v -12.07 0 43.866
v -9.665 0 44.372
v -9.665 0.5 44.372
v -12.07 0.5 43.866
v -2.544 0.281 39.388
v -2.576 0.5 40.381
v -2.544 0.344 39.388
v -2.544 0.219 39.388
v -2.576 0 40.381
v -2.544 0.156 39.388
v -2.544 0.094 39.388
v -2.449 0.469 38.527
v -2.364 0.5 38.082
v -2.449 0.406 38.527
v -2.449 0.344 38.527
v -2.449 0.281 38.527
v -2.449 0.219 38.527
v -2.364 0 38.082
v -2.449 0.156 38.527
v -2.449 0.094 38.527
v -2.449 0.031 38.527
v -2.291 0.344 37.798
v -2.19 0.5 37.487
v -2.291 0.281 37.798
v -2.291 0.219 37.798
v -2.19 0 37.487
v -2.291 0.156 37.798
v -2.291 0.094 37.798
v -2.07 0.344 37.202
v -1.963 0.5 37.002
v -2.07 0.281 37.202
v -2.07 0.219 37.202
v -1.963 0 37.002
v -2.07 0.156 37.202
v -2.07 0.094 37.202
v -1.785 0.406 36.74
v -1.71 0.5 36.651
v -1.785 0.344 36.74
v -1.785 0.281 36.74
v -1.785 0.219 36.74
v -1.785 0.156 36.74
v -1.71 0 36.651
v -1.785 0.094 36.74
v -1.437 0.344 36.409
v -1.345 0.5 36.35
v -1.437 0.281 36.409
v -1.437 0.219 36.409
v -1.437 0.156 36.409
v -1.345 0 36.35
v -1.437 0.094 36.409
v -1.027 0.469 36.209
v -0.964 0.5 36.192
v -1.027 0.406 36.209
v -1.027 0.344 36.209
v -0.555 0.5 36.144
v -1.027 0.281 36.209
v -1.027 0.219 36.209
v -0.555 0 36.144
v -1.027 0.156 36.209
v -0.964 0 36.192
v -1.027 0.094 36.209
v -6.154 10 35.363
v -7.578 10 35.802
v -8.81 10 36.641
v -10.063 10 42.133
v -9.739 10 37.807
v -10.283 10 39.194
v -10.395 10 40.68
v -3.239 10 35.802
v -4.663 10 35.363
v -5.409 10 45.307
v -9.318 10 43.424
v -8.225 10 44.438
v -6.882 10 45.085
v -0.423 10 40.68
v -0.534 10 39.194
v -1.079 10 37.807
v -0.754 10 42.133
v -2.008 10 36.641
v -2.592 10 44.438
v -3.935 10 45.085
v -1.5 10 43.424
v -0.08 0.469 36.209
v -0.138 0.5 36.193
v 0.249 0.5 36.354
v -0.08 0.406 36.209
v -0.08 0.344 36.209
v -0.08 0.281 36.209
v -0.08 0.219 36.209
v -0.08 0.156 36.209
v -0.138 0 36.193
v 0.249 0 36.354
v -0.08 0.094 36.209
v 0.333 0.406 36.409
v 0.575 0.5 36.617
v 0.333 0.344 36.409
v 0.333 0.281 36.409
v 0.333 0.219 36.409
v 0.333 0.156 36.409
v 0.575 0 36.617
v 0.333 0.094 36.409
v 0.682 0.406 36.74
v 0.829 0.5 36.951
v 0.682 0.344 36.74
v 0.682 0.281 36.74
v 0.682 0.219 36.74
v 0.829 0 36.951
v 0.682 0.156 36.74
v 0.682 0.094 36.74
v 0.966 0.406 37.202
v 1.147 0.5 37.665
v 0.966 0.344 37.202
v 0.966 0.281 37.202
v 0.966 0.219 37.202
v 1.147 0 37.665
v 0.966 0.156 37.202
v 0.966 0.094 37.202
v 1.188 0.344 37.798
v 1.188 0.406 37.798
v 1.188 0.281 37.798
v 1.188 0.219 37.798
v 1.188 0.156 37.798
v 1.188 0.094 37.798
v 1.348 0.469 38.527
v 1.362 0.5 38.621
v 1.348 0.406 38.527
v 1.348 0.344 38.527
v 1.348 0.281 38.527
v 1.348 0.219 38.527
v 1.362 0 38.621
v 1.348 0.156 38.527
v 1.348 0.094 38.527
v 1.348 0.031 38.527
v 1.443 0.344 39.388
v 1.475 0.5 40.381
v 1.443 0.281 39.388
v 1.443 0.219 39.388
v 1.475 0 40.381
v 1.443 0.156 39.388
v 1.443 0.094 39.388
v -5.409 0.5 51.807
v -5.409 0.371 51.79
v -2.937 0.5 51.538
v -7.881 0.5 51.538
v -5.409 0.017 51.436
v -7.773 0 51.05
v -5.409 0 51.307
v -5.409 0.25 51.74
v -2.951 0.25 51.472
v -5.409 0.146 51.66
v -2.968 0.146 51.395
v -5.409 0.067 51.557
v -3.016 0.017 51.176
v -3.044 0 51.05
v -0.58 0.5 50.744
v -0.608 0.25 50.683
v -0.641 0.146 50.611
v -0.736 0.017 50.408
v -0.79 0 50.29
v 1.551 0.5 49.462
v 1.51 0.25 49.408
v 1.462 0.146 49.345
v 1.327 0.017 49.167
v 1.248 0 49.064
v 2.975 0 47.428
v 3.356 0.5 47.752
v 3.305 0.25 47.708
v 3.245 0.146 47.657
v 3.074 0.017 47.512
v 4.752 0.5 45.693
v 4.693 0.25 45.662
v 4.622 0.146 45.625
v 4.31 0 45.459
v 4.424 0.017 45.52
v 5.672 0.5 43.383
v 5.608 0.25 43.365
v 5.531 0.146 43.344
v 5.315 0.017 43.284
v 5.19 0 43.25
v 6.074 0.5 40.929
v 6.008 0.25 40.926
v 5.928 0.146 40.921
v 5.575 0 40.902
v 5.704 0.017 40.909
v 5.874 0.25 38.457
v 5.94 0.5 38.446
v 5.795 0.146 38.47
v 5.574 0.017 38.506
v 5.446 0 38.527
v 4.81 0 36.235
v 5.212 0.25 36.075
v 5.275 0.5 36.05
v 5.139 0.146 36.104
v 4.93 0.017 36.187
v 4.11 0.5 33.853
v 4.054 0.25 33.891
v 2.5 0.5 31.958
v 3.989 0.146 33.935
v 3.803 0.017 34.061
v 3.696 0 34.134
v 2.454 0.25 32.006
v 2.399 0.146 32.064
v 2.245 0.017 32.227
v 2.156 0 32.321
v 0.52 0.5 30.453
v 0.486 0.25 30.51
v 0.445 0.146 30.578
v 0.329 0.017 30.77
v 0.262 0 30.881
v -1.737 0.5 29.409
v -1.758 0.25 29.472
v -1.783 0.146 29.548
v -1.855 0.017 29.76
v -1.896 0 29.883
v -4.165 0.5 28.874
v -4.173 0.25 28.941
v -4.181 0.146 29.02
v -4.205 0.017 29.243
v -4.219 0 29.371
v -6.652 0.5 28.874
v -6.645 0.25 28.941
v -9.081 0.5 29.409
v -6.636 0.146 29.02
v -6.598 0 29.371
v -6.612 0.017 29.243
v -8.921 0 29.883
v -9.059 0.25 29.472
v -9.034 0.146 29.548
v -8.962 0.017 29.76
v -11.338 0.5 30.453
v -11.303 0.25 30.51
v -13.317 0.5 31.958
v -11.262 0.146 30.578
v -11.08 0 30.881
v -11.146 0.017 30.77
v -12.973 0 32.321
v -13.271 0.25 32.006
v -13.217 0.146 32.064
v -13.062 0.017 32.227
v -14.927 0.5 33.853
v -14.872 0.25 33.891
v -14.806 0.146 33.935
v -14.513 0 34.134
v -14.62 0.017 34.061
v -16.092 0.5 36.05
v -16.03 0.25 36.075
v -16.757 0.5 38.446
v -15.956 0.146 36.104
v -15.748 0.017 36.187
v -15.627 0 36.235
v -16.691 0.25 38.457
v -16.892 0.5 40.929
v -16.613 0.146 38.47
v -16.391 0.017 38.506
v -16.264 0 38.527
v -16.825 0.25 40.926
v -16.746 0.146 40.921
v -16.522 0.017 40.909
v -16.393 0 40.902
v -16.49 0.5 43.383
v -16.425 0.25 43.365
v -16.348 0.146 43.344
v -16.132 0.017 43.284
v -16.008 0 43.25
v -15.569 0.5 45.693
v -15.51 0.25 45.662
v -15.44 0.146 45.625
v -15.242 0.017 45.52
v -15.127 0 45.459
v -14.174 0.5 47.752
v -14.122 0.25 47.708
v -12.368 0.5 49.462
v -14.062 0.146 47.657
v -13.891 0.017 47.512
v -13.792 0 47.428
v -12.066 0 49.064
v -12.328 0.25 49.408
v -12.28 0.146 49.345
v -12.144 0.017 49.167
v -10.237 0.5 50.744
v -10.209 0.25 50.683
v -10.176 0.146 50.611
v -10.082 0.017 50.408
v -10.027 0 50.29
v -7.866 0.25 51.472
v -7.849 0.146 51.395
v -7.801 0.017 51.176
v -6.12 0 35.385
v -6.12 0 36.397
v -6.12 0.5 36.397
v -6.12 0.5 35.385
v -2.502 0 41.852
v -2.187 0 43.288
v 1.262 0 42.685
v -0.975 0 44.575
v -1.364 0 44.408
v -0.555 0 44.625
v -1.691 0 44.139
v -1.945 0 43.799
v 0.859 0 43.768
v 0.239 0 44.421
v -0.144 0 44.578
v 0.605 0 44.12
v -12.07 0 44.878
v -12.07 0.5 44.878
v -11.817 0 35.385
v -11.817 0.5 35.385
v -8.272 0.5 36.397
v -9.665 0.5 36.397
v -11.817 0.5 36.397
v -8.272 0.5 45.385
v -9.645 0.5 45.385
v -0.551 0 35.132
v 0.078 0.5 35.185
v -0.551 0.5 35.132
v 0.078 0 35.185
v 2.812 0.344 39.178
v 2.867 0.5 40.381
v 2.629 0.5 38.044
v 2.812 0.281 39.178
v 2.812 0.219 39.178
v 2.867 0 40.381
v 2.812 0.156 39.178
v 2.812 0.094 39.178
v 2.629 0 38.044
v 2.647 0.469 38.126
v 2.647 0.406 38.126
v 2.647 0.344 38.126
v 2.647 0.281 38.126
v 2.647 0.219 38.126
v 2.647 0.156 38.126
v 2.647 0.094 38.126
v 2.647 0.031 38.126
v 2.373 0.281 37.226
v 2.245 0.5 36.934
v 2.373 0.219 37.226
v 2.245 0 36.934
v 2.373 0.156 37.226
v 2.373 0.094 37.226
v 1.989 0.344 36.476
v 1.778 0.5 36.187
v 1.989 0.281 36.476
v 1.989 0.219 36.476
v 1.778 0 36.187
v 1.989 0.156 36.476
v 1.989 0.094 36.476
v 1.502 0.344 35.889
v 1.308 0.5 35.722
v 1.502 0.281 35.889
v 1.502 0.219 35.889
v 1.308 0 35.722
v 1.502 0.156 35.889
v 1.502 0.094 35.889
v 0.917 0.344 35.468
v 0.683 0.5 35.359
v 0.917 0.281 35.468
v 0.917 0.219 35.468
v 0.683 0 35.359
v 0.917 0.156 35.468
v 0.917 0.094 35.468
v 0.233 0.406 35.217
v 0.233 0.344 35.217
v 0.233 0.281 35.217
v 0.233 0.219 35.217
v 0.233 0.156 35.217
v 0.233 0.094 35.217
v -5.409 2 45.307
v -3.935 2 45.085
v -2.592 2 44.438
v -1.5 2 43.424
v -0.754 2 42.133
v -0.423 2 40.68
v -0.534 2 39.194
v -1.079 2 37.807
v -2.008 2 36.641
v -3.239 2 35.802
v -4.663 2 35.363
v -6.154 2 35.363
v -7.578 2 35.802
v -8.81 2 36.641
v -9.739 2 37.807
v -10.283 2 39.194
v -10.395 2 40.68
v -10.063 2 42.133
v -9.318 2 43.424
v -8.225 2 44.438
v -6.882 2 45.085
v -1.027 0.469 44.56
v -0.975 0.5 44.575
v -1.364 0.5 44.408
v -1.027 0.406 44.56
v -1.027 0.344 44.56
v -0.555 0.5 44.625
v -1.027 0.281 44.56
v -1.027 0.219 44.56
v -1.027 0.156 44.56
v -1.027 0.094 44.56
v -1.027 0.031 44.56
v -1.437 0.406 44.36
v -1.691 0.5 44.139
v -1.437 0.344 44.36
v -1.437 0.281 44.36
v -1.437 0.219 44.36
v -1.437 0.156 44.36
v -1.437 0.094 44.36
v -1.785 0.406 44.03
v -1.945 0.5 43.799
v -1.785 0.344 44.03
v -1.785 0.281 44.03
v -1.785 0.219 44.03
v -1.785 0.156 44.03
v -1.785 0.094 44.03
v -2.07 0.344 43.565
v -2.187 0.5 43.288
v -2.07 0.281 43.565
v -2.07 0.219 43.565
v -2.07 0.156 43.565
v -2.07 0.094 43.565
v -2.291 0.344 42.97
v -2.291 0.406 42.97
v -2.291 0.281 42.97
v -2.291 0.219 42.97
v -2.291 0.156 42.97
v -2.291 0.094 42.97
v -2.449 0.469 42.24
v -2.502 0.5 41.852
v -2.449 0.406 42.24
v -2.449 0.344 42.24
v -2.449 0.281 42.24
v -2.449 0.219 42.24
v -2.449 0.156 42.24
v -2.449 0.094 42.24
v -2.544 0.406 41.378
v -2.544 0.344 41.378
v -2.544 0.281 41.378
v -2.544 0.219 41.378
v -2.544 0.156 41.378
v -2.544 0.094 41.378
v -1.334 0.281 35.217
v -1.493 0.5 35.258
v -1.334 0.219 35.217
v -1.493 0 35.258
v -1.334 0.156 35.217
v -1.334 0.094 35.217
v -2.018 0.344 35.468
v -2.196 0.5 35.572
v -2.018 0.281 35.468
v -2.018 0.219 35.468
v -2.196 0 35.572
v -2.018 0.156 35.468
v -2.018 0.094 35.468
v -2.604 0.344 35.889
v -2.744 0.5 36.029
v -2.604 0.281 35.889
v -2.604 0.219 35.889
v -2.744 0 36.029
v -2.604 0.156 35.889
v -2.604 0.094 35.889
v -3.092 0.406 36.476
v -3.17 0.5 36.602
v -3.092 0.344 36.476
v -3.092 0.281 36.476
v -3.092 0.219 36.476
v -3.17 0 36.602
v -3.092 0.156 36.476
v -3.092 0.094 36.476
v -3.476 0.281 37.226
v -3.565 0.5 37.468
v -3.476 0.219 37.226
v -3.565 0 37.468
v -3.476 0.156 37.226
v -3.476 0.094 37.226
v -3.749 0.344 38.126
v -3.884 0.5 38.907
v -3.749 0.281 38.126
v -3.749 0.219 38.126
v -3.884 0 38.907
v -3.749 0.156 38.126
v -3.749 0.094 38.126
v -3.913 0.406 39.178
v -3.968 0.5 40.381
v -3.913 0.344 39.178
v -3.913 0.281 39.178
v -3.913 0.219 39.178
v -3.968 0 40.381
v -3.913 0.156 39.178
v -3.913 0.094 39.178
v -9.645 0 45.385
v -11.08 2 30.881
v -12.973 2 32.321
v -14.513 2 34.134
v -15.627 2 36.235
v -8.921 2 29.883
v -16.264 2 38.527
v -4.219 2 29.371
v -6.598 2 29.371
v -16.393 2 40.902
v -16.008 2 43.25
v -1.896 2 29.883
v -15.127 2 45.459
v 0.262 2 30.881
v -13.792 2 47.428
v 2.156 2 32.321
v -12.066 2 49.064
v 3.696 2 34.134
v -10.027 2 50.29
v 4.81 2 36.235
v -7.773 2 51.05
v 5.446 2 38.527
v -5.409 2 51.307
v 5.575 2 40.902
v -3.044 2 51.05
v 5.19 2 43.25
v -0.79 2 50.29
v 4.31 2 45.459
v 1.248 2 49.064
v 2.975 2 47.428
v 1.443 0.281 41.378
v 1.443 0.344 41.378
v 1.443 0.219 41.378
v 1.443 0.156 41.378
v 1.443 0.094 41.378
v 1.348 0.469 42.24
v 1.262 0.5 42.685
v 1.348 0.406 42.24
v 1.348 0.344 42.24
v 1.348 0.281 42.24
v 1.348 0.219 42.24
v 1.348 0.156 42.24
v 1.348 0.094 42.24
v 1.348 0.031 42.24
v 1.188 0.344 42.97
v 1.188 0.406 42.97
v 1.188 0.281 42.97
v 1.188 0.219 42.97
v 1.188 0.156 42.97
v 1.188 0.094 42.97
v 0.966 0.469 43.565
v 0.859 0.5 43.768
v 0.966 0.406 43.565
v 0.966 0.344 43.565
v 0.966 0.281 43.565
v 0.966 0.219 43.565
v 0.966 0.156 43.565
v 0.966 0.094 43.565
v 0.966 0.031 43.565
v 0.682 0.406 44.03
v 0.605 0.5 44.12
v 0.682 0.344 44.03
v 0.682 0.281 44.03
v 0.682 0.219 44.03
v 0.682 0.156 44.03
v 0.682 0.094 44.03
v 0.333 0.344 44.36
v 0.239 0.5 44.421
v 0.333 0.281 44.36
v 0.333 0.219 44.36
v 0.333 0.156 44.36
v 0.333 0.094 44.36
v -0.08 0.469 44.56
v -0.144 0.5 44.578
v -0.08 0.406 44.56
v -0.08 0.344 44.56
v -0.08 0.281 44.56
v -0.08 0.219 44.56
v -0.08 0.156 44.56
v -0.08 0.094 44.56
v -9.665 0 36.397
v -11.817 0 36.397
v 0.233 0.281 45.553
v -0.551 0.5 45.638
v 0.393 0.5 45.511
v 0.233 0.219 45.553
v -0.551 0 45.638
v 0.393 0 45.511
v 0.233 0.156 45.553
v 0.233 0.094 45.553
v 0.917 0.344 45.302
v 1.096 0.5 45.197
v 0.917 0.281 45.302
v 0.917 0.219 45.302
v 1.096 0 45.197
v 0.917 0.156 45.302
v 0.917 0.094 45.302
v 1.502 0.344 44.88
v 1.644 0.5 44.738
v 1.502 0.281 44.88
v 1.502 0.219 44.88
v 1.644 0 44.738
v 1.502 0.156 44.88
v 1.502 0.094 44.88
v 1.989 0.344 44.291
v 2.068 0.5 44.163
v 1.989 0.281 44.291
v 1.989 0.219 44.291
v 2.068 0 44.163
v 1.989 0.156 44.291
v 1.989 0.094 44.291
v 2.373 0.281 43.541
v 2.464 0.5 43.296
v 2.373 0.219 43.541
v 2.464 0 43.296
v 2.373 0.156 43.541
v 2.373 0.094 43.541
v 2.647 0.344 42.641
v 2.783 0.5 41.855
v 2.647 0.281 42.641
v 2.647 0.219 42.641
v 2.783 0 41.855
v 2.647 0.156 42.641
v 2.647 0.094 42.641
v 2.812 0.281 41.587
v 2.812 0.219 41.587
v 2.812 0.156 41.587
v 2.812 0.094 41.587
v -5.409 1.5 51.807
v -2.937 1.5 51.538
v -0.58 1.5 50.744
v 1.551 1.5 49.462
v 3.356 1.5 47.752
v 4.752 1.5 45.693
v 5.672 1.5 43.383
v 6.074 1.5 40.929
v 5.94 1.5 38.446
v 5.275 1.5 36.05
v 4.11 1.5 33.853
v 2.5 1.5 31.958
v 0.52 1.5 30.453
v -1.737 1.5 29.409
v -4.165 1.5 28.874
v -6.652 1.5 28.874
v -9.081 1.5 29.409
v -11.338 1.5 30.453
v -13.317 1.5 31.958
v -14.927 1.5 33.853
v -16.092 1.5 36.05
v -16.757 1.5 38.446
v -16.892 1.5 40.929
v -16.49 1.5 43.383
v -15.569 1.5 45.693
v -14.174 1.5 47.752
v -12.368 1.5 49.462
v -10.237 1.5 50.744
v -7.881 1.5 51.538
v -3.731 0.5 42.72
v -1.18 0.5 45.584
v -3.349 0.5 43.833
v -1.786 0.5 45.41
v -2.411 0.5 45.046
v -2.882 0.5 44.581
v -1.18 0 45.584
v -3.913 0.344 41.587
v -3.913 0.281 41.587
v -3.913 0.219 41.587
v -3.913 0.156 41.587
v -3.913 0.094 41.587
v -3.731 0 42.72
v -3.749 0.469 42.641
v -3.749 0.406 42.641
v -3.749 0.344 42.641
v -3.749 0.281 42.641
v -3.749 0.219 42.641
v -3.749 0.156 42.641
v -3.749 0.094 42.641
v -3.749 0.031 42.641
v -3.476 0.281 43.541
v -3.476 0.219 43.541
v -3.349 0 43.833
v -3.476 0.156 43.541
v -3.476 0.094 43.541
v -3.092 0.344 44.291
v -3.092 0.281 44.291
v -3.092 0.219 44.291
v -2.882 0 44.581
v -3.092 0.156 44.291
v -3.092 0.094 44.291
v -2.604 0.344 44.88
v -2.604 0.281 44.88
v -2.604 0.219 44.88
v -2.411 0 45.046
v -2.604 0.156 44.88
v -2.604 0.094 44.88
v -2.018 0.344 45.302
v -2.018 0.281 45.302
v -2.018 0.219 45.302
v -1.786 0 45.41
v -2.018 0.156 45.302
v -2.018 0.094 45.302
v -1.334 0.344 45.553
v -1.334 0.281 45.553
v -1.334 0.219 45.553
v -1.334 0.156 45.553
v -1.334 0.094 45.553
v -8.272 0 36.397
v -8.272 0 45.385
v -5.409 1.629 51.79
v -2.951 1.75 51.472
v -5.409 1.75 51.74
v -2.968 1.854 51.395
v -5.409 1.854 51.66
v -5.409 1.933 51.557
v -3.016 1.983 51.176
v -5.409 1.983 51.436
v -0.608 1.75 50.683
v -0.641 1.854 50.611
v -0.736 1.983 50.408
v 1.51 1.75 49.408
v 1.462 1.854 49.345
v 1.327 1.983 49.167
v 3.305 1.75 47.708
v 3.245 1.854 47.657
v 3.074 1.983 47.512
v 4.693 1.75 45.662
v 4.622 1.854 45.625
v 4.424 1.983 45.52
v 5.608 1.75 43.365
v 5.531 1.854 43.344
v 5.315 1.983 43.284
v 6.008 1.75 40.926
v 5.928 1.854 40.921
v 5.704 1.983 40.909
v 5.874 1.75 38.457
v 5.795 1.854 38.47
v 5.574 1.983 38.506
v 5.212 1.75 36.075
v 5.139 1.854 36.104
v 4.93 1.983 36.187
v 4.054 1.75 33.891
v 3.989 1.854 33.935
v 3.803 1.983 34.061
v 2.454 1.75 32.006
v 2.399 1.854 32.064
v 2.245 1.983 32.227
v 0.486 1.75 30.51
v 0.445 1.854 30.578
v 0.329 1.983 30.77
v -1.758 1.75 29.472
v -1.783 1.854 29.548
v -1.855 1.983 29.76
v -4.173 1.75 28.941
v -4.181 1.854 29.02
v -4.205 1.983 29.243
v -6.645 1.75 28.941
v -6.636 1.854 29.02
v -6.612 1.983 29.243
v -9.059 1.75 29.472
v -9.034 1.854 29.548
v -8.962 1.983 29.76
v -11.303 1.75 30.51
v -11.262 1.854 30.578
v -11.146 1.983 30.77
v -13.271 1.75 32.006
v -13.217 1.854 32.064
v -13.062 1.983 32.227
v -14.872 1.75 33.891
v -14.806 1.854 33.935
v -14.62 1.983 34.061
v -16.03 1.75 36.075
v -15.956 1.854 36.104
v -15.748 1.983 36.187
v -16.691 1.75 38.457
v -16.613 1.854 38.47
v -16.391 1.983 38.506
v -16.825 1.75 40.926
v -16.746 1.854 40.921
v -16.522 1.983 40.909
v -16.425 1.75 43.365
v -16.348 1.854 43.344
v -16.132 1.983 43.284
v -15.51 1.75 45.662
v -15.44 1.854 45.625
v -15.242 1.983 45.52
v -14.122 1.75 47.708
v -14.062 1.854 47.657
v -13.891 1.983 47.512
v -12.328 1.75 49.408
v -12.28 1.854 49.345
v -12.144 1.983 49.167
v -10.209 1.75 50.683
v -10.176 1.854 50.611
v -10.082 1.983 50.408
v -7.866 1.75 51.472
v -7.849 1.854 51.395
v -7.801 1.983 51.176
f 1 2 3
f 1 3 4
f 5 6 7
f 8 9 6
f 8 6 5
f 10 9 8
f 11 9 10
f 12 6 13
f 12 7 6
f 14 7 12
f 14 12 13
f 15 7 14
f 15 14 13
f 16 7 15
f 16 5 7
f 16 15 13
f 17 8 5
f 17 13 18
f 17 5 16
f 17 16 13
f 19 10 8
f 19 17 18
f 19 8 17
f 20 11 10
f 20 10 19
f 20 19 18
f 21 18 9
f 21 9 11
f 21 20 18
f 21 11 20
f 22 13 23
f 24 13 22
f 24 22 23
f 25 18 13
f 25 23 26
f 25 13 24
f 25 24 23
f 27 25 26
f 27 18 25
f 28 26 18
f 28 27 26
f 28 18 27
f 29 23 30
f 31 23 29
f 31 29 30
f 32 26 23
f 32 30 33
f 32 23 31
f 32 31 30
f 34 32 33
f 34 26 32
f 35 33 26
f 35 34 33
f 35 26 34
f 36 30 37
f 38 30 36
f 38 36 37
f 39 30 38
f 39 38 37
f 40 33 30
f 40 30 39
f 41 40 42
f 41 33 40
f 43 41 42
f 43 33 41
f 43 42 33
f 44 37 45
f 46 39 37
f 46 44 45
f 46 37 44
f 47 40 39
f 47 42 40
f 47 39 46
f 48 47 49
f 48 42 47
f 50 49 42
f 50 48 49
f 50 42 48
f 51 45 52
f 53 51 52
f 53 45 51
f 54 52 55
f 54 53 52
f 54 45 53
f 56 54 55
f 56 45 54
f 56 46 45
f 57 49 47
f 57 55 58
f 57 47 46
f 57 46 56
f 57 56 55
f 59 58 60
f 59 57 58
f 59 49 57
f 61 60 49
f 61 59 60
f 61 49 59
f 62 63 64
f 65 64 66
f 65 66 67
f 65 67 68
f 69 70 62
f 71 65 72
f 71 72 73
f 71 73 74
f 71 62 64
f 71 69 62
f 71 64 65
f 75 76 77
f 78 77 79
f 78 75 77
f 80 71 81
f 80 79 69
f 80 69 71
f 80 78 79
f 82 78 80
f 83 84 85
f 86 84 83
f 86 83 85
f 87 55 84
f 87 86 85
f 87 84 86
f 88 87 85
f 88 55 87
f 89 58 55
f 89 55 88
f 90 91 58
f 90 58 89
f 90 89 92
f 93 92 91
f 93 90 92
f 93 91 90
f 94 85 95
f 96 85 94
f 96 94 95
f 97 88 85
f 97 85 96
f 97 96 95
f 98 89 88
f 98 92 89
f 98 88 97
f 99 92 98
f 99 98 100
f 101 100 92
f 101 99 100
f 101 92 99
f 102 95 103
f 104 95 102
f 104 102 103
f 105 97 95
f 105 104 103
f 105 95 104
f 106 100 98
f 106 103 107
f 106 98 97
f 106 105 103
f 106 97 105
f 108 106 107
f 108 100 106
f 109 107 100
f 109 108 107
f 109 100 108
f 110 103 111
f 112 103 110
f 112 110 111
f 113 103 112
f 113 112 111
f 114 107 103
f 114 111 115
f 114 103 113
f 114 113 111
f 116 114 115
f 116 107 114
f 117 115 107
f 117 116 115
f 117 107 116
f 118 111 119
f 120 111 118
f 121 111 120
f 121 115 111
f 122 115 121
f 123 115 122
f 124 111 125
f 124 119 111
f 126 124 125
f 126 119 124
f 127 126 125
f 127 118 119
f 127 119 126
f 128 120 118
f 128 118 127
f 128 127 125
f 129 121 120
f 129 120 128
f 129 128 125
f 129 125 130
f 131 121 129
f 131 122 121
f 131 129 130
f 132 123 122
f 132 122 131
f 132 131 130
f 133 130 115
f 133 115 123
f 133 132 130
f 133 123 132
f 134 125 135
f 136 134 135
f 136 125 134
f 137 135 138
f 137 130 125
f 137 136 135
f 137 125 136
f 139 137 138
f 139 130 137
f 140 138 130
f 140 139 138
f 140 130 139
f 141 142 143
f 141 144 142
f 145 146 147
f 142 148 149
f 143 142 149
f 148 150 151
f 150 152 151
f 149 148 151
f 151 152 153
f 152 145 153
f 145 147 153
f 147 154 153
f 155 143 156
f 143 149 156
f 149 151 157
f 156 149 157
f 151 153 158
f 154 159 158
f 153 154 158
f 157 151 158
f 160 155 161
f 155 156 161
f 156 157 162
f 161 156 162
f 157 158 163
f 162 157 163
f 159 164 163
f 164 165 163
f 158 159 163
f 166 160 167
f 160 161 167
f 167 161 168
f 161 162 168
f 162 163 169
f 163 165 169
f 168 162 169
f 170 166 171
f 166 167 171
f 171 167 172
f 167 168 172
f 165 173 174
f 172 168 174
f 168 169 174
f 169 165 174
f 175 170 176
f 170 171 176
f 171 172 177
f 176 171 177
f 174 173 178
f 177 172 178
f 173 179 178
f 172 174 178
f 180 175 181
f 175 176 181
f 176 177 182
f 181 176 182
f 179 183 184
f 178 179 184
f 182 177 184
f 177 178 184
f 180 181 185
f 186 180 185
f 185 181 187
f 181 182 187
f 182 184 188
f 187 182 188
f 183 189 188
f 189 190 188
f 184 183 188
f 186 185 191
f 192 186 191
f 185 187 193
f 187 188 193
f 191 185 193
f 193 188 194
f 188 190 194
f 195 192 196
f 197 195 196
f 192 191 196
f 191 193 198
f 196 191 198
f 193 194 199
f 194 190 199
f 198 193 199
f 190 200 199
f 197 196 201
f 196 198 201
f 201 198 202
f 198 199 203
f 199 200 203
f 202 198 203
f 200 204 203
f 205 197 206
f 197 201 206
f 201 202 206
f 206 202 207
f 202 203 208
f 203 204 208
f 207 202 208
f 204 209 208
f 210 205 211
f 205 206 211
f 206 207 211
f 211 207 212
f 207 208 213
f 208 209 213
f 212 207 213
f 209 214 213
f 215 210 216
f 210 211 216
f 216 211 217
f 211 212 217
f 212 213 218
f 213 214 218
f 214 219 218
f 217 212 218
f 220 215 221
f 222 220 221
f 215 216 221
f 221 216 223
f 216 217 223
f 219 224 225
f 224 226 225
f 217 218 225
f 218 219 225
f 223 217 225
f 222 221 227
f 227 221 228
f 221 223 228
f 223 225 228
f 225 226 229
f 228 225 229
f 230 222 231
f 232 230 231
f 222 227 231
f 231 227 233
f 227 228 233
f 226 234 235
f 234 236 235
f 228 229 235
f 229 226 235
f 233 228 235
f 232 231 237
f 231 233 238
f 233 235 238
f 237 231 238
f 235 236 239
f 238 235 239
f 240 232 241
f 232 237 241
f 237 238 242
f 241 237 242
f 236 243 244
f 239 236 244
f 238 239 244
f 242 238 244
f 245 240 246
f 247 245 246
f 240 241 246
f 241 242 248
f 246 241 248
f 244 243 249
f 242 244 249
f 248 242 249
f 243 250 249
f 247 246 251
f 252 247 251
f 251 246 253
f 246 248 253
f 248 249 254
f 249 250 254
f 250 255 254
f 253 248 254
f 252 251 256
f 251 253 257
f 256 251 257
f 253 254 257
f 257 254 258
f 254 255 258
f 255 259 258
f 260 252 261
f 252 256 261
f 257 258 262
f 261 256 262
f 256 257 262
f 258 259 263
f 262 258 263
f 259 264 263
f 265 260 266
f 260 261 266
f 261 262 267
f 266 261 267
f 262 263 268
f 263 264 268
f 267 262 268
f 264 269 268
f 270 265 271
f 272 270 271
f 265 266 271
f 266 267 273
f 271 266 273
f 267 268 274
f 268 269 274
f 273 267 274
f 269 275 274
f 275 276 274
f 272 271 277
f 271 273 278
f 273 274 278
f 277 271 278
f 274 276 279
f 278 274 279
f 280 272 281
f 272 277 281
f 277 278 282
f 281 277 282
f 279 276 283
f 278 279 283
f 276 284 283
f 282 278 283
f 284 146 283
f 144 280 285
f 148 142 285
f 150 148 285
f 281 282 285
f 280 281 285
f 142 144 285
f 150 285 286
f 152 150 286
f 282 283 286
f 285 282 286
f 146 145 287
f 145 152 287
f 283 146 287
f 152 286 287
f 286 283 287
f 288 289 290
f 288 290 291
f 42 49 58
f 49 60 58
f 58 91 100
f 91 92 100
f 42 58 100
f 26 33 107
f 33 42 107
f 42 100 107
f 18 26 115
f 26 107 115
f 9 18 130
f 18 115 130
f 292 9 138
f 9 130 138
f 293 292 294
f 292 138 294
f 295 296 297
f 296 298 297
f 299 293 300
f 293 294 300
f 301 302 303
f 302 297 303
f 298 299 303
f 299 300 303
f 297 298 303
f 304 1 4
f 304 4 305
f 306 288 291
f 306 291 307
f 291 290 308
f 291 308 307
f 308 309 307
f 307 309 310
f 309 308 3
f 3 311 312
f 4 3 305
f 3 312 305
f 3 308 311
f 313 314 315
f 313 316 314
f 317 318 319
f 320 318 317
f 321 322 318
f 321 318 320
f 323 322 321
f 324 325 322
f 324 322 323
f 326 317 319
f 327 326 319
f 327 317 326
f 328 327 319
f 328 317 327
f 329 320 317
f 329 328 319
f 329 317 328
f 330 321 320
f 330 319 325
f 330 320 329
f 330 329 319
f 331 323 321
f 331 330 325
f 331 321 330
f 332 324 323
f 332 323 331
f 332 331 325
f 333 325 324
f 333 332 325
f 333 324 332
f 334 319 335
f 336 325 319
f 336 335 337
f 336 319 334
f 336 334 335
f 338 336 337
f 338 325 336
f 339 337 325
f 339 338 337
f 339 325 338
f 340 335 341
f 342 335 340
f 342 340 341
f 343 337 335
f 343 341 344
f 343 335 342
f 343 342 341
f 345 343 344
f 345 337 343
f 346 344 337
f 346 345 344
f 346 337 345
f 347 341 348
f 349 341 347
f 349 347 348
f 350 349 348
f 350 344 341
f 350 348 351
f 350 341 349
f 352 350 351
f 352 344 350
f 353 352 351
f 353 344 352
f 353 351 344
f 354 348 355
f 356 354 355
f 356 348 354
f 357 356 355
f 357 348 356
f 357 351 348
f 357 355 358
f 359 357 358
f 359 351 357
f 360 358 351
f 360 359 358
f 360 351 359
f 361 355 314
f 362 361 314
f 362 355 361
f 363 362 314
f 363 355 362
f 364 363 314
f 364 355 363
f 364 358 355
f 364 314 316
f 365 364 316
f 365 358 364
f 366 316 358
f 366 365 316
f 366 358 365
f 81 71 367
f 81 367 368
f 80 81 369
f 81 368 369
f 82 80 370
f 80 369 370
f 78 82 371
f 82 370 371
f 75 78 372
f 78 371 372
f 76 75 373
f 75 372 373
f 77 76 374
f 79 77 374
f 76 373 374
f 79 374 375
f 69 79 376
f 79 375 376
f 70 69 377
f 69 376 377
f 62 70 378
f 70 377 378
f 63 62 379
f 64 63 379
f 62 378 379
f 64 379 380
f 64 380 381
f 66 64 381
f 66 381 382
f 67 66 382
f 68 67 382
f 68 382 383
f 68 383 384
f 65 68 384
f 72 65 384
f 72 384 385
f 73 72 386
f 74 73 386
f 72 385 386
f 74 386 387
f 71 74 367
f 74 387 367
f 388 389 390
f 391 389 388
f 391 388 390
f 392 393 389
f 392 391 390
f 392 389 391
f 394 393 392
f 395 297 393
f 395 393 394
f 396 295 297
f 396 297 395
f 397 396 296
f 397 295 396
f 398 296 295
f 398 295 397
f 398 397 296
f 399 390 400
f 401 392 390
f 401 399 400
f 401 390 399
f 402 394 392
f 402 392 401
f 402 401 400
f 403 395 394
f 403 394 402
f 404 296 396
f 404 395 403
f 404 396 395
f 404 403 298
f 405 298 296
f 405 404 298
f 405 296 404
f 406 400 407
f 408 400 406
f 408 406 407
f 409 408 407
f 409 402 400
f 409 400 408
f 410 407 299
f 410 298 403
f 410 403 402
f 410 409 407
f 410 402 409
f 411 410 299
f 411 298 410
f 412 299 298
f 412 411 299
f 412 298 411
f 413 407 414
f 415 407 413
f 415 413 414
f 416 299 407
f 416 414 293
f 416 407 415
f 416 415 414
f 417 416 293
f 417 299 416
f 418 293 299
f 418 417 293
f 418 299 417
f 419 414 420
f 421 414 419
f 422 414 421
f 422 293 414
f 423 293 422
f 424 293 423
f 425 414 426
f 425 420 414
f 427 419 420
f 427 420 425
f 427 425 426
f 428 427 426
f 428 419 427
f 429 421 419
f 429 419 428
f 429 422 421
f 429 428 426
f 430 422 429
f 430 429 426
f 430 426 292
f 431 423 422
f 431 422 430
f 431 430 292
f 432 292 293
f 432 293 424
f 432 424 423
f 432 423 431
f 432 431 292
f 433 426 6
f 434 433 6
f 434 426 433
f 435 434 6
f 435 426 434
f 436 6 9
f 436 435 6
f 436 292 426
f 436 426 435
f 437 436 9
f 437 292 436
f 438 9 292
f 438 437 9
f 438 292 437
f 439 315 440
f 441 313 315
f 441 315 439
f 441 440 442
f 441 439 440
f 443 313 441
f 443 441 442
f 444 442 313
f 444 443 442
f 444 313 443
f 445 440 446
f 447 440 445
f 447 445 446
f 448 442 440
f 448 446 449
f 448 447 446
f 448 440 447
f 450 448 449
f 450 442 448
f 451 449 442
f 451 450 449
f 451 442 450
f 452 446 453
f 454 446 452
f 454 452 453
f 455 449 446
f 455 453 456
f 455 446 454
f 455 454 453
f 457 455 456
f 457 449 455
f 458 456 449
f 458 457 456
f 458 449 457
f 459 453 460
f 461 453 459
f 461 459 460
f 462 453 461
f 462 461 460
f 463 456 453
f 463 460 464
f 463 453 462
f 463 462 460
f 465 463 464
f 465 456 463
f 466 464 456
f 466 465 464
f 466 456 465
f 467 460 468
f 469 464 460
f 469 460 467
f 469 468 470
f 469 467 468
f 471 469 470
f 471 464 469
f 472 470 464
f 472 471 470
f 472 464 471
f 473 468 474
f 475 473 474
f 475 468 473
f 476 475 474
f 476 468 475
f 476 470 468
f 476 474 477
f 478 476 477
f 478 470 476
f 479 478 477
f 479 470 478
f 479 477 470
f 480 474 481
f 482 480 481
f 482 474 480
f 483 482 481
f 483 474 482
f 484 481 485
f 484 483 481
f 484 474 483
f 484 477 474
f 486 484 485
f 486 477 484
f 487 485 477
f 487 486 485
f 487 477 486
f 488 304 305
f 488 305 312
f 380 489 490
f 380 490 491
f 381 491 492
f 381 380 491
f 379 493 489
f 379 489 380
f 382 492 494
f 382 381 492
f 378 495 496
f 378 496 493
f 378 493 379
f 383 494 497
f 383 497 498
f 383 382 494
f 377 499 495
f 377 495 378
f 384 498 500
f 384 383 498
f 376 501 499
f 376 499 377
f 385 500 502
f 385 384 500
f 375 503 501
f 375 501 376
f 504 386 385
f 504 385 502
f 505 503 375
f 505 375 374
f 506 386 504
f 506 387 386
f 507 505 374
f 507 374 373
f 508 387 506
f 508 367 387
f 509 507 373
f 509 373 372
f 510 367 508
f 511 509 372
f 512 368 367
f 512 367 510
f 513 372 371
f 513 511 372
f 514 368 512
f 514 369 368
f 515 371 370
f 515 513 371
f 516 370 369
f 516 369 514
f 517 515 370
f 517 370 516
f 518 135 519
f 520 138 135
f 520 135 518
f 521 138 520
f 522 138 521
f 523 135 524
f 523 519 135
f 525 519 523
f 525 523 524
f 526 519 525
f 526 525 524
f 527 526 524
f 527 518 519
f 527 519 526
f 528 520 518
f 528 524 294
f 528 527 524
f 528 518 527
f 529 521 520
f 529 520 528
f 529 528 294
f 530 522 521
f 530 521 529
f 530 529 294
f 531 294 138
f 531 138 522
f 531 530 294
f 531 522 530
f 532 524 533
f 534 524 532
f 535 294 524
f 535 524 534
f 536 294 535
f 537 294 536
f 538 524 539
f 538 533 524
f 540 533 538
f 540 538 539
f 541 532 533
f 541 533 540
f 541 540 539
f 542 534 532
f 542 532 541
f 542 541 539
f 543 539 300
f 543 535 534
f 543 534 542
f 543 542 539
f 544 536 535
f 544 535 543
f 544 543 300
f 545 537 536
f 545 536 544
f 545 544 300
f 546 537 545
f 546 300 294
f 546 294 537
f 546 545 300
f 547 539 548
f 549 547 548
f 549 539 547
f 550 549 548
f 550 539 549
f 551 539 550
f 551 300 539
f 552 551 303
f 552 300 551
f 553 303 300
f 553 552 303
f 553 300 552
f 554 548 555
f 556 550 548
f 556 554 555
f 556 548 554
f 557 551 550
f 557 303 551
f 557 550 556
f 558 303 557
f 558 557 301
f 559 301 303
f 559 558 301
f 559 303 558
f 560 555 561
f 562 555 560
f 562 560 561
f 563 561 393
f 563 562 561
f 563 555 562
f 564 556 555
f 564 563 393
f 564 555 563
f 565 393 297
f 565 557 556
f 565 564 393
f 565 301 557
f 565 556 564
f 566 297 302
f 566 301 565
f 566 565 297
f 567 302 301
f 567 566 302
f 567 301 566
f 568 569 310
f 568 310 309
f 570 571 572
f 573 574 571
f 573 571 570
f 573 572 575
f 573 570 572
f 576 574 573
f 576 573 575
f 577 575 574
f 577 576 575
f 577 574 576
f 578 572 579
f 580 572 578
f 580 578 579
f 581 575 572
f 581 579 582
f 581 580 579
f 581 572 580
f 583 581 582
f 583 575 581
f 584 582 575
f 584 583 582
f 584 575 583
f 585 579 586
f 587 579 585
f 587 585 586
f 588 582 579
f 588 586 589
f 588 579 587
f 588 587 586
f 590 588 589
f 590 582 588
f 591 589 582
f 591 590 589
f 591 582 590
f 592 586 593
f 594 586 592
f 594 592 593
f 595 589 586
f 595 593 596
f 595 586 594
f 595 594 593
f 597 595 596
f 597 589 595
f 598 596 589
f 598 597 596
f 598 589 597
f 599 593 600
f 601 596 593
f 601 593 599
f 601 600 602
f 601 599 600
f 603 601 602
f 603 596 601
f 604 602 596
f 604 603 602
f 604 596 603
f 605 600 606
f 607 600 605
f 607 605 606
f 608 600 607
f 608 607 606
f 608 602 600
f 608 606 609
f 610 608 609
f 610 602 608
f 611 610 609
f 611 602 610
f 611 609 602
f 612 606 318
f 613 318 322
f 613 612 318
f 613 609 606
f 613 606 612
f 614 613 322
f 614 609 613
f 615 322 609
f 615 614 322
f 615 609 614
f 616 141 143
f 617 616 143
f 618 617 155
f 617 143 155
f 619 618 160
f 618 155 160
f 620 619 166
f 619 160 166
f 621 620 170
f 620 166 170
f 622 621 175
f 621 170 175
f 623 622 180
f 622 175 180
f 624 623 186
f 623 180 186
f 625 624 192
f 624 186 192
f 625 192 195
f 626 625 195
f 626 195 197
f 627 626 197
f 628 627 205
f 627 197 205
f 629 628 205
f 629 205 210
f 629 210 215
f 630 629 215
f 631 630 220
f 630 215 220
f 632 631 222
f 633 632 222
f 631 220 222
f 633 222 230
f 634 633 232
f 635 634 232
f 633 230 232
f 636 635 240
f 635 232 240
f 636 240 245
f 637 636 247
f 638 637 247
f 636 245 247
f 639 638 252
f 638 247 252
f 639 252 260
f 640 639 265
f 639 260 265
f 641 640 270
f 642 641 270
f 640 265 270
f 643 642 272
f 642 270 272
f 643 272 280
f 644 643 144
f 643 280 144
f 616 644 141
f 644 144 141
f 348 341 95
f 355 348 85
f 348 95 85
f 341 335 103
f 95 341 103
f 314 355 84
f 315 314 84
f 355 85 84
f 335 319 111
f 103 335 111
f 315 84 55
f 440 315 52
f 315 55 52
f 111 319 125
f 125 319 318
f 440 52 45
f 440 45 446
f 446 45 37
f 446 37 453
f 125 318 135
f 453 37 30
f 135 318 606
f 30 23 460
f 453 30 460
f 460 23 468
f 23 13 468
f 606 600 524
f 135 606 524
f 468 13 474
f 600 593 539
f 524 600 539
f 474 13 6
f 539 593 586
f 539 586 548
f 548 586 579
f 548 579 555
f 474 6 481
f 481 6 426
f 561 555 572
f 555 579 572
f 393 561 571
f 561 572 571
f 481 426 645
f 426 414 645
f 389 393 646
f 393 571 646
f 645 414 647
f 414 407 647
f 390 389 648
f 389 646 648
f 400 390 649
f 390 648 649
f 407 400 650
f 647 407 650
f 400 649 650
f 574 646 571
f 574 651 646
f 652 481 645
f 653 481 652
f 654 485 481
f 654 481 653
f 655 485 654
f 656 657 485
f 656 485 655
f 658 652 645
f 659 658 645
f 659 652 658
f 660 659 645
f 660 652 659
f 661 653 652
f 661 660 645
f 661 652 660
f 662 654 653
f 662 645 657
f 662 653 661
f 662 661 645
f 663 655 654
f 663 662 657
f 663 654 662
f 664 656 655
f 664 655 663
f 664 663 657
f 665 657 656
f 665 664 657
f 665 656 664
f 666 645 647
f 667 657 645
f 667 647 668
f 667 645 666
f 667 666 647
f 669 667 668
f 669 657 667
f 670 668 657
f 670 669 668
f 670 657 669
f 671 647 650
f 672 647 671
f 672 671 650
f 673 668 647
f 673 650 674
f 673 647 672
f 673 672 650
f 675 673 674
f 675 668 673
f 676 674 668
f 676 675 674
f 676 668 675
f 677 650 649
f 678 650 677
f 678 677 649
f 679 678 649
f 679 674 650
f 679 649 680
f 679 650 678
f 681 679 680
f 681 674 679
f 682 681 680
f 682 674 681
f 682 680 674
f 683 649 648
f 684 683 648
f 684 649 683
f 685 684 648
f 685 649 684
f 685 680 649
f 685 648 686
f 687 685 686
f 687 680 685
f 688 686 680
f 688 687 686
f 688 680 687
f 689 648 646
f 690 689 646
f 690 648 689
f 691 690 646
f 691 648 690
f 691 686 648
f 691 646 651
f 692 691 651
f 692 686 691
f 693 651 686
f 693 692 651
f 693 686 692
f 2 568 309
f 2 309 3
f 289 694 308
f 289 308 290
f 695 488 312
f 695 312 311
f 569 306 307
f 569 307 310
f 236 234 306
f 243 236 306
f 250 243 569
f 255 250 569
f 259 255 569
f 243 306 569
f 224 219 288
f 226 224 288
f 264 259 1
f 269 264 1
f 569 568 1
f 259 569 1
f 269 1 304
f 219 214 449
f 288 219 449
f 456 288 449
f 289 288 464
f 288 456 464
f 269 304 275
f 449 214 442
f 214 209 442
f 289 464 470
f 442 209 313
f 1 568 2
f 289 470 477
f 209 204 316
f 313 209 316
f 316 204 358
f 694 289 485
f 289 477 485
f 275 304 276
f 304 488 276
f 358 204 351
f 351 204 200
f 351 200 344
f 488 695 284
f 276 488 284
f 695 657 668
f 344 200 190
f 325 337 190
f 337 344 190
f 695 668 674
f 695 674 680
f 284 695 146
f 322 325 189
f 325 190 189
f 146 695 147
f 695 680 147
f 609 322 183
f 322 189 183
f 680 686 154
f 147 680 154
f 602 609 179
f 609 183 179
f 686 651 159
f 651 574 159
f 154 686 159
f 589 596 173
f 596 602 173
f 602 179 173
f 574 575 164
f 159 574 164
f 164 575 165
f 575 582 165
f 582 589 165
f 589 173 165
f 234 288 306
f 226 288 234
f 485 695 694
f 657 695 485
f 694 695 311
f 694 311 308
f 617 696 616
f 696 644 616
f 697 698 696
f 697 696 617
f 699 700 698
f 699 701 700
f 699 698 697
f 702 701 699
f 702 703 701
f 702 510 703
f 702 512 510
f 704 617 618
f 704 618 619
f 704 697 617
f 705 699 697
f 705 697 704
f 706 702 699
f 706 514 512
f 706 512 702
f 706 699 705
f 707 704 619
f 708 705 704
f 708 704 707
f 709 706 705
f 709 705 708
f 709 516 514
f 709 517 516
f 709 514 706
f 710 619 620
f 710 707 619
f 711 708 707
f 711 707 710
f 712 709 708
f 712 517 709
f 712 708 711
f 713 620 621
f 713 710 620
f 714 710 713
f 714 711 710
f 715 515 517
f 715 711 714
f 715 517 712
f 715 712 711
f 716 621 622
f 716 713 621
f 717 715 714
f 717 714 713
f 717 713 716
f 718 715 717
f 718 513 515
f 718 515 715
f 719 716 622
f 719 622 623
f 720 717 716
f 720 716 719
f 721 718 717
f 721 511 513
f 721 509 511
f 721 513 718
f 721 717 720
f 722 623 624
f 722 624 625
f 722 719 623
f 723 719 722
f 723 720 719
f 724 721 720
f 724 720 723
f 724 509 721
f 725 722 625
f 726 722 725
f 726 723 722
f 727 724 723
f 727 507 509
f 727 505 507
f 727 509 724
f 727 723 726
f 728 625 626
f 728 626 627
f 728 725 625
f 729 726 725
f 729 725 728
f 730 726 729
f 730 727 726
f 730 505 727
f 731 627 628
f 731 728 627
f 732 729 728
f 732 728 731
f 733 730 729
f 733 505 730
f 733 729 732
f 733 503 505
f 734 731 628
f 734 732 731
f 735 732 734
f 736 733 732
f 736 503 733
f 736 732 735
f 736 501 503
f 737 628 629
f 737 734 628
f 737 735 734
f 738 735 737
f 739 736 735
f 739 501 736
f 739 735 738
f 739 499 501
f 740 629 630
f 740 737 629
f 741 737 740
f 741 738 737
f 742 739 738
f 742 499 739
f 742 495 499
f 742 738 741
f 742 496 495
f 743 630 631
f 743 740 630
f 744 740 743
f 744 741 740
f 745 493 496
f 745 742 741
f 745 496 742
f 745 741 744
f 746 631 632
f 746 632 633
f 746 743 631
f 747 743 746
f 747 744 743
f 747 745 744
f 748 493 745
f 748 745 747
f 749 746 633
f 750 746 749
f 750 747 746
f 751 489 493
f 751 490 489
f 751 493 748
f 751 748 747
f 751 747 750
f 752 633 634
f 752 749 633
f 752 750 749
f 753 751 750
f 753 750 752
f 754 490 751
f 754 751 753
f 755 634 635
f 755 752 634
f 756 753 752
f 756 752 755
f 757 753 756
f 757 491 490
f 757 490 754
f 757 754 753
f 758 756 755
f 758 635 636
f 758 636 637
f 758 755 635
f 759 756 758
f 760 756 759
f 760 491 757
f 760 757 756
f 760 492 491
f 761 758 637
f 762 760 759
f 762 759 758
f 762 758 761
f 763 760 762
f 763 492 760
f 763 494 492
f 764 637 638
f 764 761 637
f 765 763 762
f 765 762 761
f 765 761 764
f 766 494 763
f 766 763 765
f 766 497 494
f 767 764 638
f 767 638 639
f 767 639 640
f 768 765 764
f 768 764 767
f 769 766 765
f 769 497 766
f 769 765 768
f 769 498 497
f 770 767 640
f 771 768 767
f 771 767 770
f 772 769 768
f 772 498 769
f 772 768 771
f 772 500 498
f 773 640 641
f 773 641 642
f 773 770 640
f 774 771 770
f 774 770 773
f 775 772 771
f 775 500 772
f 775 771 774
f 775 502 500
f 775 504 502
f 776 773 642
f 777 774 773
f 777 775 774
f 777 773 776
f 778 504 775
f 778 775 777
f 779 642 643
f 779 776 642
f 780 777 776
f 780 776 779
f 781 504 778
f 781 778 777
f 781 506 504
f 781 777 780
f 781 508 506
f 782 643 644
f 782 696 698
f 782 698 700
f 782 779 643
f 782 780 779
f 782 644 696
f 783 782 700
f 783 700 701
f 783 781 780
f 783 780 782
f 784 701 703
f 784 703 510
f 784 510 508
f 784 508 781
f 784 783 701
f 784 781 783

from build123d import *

# Parameters (mm, degrees)
SKETCH1_R           = 11.5
BOSS_EXTRUDE5_DEPTH = 2
SKETCH4_R           = 5
BOSS_EXTRUDE6_DEPTH = 8
CUT_EXTRUDE2_DEPTH  = 0.5
FILLET1_R           = 0.5


with BuildPart() as part:
    # Sketch1 → Boss-Extrude5 (new body)
    with BuildSketch(Plane(origin=(0, 0, 0), x_dir=(1, 0, 0), z_dir=(0, 1, 0))):
        with Locations(Location((-5.408676197, -40.3067379, 0), (0, 0, 270))):
            Circle(SKETCH1_R)
    extrude(amount=BOSS_EXTRUDE5_DEPTH)

    # Sketch4 → Boss-Extrude6 (add)
    with BuildSketch(Plane(origin=(0, 2, 0), x_dir=(1, 0, 0), z_dir=(0, 1, 0))):
        with Locations(Location((-5.408676197, -40.3067379, 0), (0, 0, 270))):
            Circle(SKETCH4_R)
    extrude(amount=BOSS_EXTRUDE6_DEPTH)

    # Sketch5 → Cut-Extrude2 (cut)
    # profile 1 of 2: a face of its own
    with BuildSketch(Plane.XZ):
        Polygon((-11.816511362, 36.397340578), (-9.664612628, 36.397340578), (-9.664612628, 44.372024123), (-12.069675919, 43.865695009), (-12.069675919, 44.878353237), (-9.644834147, 45.38468235), (-8.272207565, 45.38468235), (-8.272207565, 36.397340578), (-6.120308831, 36.397340578), (-6.120308831, 35.38468235), (-11.816511362, 35.38468235), align=None)
    # profile 2 of 2: a face of its own
    with BuildSketch(Plane.XZ):
        with BuildLine():
            add(Edge.make_bspline(
                [(-0.550688578, 45.637846907), (-0.415938804, 45.633730166), (-0.152802852, 45.625691098), (0.229163714, 45.561237383), (0.586683797, 45.456245103), (0.920332152, 45.309789042), (1.227359965, 45.117028679), (1.510292763, 44.884079449), (1.767374377, 44.607527173), (1.998267531, 44.289408333), (2.204159406, 43.931981409), (2.381194089, 43.535679405), (2.534314002, 43.103516508), (2.654820834, 42.631767759), (2.752456274, 42.123354369), (2.816869131, 41.576005545), (2.859979178, 40.99125567), (2.864632597, 40.588485261), (2.867032941, 40.380726654)],
                knots=[0, 0, 0, 0, 0.914621173, 1.786049105, 2.621809963, 3.439570598, 4.25200759, 5.075726843, 5.921440778, 6.808834034, 7.739519474, 8.717306742, 9.75236949, 10.849108534, 12.020406428, 13.265380358, 14.589417808, 16, 16, 16, 16], degree=3))
            add(Edge.make_bspline(
                [(2.867032941, 40.380726654), (2.864644222, 40.173625568), (2.86001379, 39.772168798), (2.816709133, 39.188761145), (2.752698639, 38.642668217), (2.654549419, 38.135010363), (2.534332528, 37.663871958), (2.381219253, 37.231685314), (2.204051011, 36.835485659), (1.998914362, 36.478161083), (1.766700275, 36.161674678), (1.510372243, 35.885227112), (1.227339233, 35.652351187), (0.92033771, 35.459571593), (0.58668227, 35.313120715), (0.229164144, 35.208127003), (-0.152802968, 35.143673687), (-0.415938843, 35.135634563), (-0.550688578, 35.131517794)],
                knots=[0, 0, 0, 0, 1.407597425, 2.728568576, 3.974862697, 5.143000578, 6.240902623, 7.277062968, 8.255887098, 9.187559452, 10.072280029, 10.918890773, 11.743483511, 12.556782025, 13.375409826, 14.212056939, 15.084408948, 16, 16, 16, 16], degree=3))
            add(Edge.make_bspline(
                [(-0.550688578, 35.131517794), (-0.6854385, 35.135634386), (-0.948574743, 35.143673163), (-1.330539237, 35.208128951), (-1.688066752, 35.313113795), (-2.021688201, 35.459596777), (-2.328815845, 35.652257252), (-2.611716883, 35.885875244), (-2.870168983, 36.160946148), (-3.102194243, 36.478253797), (-3.307287706, 36.835508053), (-3.48508341, 37.231281228), (-3.635082086, 37.66432144), (-3.756126667, 38.134940569), (-3.854016818, 38.642688789), (-3.91810349, 39.188755145), (-3.961386204, 39.772170452), (-3.966019764, 40.173626131), (-3.968410097, 40.380726654)],
                knots=[0, 0, 0, 0, 0.915500487, 1.787766207, 2.624330562, 3.442877389, 4.256095455, 5.080606629, 5.930200102, 6.814833167, 7.746413364, 8.725140674, 9.759714696, 10.857508142, 12.025530477, 13.27170132, 14.592541807, 16, 16, 16, 16], degree=3))
            add(Edge.make_bspline(
                [(-3.968410097, 40.380726654), (-3.966008131, 40.588484695), (-3.961351569, 40.991254008), (-3.918263552, 41.576011567), (-3.853774368, 42.123333768), (-3.756398925, 42.631837847), (-3.63506368, 43.103067057), (-3.485058278, 43.536083527), (-3.307396088, 43.931958995), (-3.101547546, 44.289315613), (-2.870846186, 44.608258357), (-2.611637461, 44.883431398), (-2.32883653, 45.117122569), (-2.021682655, 45.30976387), (-1.688068275, 45.45625202), (-1.330538808, 45.561235436), (-0.948574858, 45.625691622), (-0.685438539, 45.633730344), (-0.550688578, 45.637846907)],
                knots=[0, 0, 0, 0, 1.410442812, 2.734349433, 3.979200347, 5.150382505, 6.24701318, 7.280491394, 8.258182046, 9.188775525, 10.076081097, 10.924774691, 11.748412552, 12.560769267, 13.378449099, 14.214127375, 15.085469201, 16, 16, 16, 16], degree=3))
        make_face()
        with BuildLine():
            add(Edge.make_bspline(
                [(-0.554644274, 44.62518868), (-0.635989574, 44.622401752), (-0.795646719, 44.616931825), (-1.026841529, 44.566459489), (-1.242386869, 44.482103579), (-1.441486777, 44.363897306), (-1.625737076, 44.213545447), (-1.792639211, 44.028975958), (-1.943217724, 43.811177792), (-2.076899469, 43.560448999), (-2.195580983, 43.277641024), (-2.297639092, 42.961856636), (-2.383967094, 42.612798562), (-2.454448483, 42.230321244), (-2.509050303, 41.815044266), (-2.548039786, 41.366310053), (-2.571798824, 40.8846772), (-2.574574099, 40.552168459), (-2.576005033, 40.380726654)],
                knots=[0, 0, 0, 0, 0.748569641, 1.469224287, 2.167313872, 2.872447611, 3.593306944, 4.349889458, 5.156880845, 6.026416454, 6.962619852, 7.978571635, 9.080333099, 10.272657594, 11.559295133, 12.937179704, 14.420807114, 16, 16, 16, 16], degree=3))
            add(Edge.make_bspline(
                [(-2.576005033, 40.380726654), (-2.574582635, 40.209943239), (-2.571824242, 39.878750606), (-2.547925246, 39.398448218), (-2.509225008, 38.951001137), (-2.45425411, 38.536431355), (-2.383976272, 38.154591028), (-2.297666503, 37.805513593), (-2.195476658, 37.489802584), (-2.077472273, 37.20728493), (-1.942625912, 36.957849971), (-1.792702591, 36.740354541), (-1.625721415, 36.555827706), (-1.441490789, 36.40546523), (-1.242385817, 36.287261689), (-1.026841818, 36.202905056), (-0.795646642, 36.152432918), (-0.635989549, 36.146962963), (-0.554644274, 36.144176021)],
                knots=[0, 0, 0, 0, 1.575434164, 3.05516895, 4.435080037, 5.717581461, 6.91165956, 8.015041434, 9.032487421, 9.970067734, 10.835534704, 11.643712969, 12.401408222, 13.123327754, 13.829498565, 14.528614861, 15.250329405, 16, 16, 16, 16], degree=3))
            add(Edge.make_bspline(
                [(-0.554644274, 36.144176021), (-0.472616683, 36.146871841), (-0.312254594, 36.152142109), (-0.0794757, 36.203726771), (0.138133244, 36.286201975), (0.338090945, 36.405582767), (0.522379645, 36.55579412), (0.689341824, 36.740364859), (0.839280394, 36.957844948), (0.974082065, 37.207294623), (1.092268814, 37.489765126), (1.193740002, 37.805824707), (1.283313605, 38.15424386), (1.352654751, 38.536487567), (1.407914192, 38.950984355), (1.446528422, 39.398453194), (1.470452529, 39.878749229), (1.473207332, 40.20994277), (1.474627878, 40.380726654)],
                knots=[0, 0, 0, 0, 0.75484838, 1.475711535, 2.185326637, 2.890664395, 3.611732298, 4.368533717, 5.175758594, 6.040204595, 6.976678868, 7.992924601, 9.096493949, 10.289163424, 11.570151914, 12.948435155, 14.426424335, 16, 16, 16, 16], degree=3))
            add(Edge.make_bspline(
                [(1.474627878, 40.380726654), (1.473198806, 40.55216893), (1.470427142, 40.884678585), (1.446642874, 41.366305056), (1.407739604, 41.815061077), (1.352847963, 42.230264739), (1.28330429, 42.6131457), (1.193712582, 42.961545506), (1.092373097, 43.277678471), (0.973509023, 43.560439245), (0.839872237, 43.811182841), (0.689278446, 44.028965642), (0.522395306, 44.213579032), (0.338086936, 44.363779771), (0.138134314, 44.483163303), (-0.079475991, 44.565637773), (-0.312254517, 44.617222634), (-0.472616657, 44.622492874), (-0.554644274, 44.62518868)],
                knots=[0, 0, 0, 0, 1.577332685, 3.059212465, 4.435473965, 5.720595916, 6.91151592, 8.013466492, 9.028221541, 9.963322143, 10.831833488, 11.637874284, 12.393565586, 13.113575787, 13.817878918, 14.526453118, 15.246258873, 16, 16, 16, 16], degree=3))
        make_face(mode=Mode.SUBTRACT)
    extrude(amount=-CUT_EXTRUDE2_DEPTH, mode=Mode.SUBTRACT)

    # Fillet1
    fillet1_edges = [part.edges().sort_by_distance(p)[0] for p in [
        (-5.408676197, 0, 28.8067379),
        (-5.408676197, 2, 28.8067379),
    ]]
    fillet(fillet1_edges, radius=FILLET1_R)


solid = part.part
